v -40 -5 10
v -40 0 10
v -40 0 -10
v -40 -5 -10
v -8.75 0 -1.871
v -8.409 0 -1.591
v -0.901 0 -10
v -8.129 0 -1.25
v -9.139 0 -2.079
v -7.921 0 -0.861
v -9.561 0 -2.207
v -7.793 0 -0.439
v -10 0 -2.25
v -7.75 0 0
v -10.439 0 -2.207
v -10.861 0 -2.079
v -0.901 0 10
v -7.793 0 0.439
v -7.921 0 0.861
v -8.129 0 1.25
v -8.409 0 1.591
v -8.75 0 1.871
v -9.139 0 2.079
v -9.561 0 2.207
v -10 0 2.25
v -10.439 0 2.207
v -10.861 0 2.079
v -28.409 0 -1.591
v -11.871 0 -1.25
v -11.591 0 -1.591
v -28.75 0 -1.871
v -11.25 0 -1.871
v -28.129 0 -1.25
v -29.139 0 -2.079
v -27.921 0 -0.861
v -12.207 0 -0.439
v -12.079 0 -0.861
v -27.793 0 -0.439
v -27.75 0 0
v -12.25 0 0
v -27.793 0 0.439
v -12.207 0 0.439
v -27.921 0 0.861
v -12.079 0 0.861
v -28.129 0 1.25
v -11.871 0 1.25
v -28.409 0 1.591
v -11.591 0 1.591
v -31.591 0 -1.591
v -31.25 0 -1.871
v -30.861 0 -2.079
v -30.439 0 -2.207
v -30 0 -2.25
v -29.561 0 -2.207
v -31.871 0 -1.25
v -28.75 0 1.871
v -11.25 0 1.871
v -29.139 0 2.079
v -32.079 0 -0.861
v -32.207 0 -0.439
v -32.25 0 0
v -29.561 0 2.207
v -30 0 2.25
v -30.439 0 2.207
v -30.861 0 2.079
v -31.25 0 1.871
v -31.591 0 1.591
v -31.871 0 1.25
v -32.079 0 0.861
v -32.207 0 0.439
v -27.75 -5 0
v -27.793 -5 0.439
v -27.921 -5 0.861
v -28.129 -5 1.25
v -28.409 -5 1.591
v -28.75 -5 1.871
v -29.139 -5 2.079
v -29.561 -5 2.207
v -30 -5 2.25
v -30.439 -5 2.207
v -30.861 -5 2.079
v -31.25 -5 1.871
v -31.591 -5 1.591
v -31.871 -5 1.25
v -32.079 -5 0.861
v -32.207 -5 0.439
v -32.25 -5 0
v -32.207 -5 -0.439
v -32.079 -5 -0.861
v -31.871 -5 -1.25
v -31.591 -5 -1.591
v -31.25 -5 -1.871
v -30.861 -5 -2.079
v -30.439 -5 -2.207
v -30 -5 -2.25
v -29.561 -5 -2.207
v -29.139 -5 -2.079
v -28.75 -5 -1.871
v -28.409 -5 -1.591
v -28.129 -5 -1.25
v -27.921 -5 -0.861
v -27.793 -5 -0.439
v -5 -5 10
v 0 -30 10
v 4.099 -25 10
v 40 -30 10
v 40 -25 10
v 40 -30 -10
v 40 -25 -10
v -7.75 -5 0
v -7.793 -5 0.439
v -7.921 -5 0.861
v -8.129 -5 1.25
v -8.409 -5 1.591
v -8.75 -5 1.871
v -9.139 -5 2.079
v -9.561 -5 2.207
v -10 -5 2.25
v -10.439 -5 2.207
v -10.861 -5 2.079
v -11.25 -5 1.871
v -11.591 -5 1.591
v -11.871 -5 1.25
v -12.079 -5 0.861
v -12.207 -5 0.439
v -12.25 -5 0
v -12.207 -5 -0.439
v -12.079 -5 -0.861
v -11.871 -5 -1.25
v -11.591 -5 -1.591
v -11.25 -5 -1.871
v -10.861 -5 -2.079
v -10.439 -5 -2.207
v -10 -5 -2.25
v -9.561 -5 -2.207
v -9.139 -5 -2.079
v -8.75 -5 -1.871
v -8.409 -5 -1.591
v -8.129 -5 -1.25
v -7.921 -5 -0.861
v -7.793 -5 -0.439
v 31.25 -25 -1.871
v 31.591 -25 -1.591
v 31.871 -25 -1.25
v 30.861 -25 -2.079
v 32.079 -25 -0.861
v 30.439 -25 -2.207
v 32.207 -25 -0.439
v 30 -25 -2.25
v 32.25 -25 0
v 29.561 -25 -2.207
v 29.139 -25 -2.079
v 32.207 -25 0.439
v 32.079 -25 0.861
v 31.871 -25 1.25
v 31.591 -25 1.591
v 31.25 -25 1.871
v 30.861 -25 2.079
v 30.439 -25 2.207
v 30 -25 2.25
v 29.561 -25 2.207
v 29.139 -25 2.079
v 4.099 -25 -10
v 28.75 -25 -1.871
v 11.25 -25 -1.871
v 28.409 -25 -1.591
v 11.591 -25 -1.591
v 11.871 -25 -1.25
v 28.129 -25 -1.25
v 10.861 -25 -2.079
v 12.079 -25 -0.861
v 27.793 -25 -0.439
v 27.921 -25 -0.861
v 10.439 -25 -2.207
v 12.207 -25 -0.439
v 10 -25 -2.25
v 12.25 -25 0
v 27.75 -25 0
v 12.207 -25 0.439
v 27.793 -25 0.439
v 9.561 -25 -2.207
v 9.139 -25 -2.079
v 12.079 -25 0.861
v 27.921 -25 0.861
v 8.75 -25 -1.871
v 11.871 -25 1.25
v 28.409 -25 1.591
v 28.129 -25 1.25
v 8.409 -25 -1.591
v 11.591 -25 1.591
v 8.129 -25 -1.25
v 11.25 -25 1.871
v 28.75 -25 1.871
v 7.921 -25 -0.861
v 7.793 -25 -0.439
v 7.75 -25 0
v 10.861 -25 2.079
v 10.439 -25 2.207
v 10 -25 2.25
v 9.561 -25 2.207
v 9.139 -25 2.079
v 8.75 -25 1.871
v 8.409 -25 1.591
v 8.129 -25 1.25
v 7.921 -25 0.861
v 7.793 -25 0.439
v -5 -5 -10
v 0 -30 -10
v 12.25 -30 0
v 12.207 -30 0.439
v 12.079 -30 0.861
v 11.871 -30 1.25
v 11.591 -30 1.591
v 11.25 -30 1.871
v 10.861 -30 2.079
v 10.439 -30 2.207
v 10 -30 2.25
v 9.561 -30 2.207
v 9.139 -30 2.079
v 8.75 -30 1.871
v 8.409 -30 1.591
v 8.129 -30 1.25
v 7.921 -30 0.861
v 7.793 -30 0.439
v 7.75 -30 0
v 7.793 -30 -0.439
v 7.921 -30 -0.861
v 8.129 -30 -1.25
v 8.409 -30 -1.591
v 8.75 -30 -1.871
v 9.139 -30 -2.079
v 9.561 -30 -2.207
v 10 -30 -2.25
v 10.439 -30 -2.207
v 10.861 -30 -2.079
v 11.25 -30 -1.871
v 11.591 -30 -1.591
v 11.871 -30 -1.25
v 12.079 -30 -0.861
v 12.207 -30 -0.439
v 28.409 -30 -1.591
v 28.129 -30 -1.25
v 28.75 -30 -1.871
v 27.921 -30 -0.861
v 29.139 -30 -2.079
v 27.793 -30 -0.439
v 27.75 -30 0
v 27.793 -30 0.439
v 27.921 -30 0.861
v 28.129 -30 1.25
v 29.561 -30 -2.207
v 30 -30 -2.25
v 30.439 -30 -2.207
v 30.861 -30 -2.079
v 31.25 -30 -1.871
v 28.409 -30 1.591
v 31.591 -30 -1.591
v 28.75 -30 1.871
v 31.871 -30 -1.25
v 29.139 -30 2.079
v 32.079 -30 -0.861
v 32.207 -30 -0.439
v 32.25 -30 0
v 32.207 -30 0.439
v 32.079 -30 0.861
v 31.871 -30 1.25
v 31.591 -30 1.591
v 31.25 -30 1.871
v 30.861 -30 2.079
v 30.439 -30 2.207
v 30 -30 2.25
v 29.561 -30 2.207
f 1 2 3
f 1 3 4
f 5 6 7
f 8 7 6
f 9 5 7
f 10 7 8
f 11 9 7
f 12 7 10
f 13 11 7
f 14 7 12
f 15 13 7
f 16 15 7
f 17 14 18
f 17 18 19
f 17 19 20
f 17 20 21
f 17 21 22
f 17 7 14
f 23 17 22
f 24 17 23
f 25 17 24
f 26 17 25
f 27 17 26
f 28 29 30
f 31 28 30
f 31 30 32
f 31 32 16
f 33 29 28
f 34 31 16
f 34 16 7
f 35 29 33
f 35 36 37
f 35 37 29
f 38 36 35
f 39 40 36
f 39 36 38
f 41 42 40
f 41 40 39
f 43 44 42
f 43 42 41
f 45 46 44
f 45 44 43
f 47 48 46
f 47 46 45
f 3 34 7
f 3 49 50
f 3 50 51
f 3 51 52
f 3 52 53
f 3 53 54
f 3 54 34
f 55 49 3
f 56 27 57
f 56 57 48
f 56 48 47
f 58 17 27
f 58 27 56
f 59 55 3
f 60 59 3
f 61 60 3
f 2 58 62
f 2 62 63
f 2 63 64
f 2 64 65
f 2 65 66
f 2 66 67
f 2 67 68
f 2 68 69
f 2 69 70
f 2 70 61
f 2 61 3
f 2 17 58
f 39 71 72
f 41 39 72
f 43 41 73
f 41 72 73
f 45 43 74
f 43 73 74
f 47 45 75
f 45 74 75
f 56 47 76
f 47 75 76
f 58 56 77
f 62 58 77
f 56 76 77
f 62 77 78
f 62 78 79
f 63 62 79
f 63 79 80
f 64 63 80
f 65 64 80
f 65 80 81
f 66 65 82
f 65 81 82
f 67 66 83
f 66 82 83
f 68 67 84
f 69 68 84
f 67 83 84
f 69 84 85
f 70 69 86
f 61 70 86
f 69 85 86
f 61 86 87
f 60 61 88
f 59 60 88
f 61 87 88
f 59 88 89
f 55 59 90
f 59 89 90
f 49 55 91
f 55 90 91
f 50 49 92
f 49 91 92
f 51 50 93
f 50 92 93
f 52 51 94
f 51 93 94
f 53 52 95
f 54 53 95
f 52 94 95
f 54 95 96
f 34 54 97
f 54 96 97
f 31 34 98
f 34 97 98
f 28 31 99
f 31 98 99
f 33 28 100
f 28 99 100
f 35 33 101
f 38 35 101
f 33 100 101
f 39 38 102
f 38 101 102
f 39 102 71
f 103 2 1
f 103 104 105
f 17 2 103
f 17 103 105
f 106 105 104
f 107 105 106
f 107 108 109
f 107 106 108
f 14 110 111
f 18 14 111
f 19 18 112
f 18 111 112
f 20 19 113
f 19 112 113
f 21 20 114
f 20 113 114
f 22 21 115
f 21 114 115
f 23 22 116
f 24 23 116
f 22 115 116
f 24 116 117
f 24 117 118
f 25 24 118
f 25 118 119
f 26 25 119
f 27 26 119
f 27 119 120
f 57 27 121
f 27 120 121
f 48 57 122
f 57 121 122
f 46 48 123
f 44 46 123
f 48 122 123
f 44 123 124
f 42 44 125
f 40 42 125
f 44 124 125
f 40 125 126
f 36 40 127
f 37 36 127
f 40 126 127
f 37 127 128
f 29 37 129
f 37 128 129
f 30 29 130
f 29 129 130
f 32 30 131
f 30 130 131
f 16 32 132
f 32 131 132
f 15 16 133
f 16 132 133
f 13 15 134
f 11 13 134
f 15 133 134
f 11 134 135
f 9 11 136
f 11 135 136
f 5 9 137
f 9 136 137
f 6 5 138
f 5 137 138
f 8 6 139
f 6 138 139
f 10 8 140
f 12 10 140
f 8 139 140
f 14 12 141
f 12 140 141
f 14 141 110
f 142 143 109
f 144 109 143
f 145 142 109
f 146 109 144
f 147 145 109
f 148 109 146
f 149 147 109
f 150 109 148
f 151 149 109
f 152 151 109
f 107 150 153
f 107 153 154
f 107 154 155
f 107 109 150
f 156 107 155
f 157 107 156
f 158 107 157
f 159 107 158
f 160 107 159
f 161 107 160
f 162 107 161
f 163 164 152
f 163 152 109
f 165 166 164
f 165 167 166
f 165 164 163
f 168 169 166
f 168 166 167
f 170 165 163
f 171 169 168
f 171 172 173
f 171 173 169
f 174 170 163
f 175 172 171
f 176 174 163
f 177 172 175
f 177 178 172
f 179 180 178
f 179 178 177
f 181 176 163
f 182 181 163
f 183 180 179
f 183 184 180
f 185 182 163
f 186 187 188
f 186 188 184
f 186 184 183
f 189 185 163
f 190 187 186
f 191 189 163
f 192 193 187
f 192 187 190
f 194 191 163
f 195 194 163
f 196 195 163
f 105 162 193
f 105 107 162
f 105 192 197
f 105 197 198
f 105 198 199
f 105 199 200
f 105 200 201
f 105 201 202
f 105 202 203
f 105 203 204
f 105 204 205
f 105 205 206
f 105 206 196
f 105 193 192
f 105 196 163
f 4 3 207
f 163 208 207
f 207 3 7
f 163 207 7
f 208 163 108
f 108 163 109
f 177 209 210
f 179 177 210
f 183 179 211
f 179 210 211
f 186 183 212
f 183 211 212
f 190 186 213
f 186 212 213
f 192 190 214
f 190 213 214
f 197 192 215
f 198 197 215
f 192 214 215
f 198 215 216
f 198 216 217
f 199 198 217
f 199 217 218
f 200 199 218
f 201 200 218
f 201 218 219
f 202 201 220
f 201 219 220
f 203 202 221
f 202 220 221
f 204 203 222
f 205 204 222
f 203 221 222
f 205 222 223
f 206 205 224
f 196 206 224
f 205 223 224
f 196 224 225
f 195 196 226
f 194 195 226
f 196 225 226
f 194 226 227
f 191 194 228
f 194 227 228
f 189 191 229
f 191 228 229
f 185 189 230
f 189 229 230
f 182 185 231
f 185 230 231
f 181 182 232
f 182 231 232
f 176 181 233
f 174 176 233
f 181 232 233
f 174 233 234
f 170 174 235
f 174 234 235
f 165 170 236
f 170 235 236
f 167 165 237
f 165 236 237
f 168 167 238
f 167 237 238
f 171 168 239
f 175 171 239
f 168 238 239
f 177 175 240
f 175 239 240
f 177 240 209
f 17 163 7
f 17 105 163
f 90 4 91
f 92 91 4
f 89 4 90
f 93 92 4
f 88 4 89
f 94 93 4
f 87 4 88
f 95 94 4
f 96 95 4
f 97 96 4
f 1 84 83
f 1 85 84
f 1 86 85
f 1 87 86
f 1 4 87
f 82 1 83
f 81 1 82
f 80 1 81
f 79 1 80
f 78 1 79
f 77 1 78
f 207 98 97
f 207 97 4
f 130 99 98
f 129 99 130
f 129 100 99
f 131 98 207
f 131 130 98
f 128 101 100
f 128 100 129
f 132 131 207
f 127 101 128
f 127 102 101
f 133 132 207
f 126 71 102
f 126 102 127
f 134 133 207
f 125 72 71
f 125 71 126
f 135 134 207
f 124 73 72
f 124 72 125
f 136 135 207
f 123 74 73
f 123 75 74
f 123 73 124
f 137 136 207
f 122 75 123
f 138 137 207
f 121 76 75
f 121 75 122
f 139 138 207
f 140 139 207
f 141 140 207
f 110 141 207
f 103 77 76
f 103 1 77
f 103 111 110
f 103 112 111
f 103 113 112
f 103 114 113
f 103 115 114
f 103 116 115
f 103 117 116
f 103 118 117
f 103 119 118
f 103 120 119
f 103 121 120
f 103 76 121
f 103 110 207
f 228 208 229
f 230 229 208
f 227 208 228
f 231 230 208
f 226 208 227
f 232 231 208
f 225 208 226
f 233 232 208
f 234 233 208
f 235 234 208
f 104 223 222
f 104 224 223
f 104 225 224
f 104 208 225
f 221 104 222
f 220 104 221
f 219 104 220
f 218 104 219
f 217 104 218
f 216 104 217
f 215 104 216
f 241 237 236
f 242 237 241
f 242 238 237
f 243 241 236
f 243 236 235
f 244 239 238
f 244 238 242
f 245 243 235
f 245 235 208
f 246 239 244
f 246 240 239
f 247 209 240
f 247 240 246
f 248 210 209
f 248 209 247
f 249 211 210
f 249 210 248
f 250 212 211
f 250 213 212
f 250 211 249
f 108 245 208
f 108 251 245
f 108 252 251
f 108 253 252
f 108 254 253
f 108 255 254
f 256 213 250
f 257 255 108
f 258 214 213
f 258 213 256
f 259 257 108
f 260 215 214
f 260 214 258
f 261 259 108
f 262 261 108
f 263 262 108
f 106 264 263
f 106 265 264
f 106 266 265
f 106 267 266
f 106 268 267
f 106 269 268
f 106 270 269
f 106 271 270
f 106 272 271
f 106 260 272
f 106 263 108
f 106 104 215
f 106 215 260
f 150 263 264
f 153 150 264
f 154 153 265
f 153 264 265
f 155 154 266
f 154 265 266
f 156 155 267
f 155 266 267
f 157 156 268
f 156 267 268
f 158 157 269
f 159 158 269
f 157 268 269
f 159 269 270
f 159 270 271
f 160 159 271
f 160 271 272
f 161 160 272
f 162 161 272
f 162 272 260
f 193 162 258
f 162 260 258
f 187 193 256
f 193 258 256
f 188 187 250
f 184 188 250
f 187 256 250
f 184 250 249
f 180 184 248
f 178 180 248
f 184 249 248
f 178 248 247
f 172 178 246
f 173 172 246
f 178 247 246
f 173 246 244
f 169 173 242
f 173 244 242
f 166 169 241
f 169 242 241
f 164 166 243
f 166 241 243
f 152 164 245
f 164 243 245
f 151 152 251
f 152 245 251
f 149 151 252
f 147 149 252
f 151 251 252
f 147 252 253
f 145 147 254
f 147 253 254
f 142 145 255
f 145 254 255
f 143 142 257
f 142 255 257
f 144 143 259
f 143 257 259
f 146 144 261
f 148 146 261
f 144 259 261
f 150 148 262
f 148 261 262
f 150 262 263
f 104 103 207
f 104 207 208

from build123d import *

# Parameters (mm, degrees)
F1_DEPTH = 10
F2_R     = 2.25
F3_DEPTH = 5
F4_R     = 2.25
F5_DEPTH = 5


with BuildPart() as f1:
    # F0 (on Top) → F1 (new body, symmetric)
    with BuildSketch(Plane.XY):
        Polygon((4.0990195136, -25), (-0.9009804864, 0), (-40, 0), (-40, -5), (-5, -5), (0, -30), (40, -30), (40, -25), align=None)
    extrude(amount=F1_DEPTH, both=True)

    # F2 (on face) → F3 (cut, through all)
    with BuildSketch(Plane.XZ.offset(5)):
        with Locations((-30, 0)):
            Circle(F2_R)
        with Locations((-10, 0)):
            Circle(F2_R)
    extrude(amount=-F3_DEPTH, mode=Mode.SUBTRACT)

    # F4 (on face) → F5 (cut, through all)
    with BuildSketch(Plane.XZ.offset(30)):
        with Locations((10, 0)):
            Circle(F4_R)
        with Locations((30, 0)):
            Circle(F4_R)
    extrude(amount=-F5_DEPTH, mode=Mode.SUBTRACT)


solid = f1.part
